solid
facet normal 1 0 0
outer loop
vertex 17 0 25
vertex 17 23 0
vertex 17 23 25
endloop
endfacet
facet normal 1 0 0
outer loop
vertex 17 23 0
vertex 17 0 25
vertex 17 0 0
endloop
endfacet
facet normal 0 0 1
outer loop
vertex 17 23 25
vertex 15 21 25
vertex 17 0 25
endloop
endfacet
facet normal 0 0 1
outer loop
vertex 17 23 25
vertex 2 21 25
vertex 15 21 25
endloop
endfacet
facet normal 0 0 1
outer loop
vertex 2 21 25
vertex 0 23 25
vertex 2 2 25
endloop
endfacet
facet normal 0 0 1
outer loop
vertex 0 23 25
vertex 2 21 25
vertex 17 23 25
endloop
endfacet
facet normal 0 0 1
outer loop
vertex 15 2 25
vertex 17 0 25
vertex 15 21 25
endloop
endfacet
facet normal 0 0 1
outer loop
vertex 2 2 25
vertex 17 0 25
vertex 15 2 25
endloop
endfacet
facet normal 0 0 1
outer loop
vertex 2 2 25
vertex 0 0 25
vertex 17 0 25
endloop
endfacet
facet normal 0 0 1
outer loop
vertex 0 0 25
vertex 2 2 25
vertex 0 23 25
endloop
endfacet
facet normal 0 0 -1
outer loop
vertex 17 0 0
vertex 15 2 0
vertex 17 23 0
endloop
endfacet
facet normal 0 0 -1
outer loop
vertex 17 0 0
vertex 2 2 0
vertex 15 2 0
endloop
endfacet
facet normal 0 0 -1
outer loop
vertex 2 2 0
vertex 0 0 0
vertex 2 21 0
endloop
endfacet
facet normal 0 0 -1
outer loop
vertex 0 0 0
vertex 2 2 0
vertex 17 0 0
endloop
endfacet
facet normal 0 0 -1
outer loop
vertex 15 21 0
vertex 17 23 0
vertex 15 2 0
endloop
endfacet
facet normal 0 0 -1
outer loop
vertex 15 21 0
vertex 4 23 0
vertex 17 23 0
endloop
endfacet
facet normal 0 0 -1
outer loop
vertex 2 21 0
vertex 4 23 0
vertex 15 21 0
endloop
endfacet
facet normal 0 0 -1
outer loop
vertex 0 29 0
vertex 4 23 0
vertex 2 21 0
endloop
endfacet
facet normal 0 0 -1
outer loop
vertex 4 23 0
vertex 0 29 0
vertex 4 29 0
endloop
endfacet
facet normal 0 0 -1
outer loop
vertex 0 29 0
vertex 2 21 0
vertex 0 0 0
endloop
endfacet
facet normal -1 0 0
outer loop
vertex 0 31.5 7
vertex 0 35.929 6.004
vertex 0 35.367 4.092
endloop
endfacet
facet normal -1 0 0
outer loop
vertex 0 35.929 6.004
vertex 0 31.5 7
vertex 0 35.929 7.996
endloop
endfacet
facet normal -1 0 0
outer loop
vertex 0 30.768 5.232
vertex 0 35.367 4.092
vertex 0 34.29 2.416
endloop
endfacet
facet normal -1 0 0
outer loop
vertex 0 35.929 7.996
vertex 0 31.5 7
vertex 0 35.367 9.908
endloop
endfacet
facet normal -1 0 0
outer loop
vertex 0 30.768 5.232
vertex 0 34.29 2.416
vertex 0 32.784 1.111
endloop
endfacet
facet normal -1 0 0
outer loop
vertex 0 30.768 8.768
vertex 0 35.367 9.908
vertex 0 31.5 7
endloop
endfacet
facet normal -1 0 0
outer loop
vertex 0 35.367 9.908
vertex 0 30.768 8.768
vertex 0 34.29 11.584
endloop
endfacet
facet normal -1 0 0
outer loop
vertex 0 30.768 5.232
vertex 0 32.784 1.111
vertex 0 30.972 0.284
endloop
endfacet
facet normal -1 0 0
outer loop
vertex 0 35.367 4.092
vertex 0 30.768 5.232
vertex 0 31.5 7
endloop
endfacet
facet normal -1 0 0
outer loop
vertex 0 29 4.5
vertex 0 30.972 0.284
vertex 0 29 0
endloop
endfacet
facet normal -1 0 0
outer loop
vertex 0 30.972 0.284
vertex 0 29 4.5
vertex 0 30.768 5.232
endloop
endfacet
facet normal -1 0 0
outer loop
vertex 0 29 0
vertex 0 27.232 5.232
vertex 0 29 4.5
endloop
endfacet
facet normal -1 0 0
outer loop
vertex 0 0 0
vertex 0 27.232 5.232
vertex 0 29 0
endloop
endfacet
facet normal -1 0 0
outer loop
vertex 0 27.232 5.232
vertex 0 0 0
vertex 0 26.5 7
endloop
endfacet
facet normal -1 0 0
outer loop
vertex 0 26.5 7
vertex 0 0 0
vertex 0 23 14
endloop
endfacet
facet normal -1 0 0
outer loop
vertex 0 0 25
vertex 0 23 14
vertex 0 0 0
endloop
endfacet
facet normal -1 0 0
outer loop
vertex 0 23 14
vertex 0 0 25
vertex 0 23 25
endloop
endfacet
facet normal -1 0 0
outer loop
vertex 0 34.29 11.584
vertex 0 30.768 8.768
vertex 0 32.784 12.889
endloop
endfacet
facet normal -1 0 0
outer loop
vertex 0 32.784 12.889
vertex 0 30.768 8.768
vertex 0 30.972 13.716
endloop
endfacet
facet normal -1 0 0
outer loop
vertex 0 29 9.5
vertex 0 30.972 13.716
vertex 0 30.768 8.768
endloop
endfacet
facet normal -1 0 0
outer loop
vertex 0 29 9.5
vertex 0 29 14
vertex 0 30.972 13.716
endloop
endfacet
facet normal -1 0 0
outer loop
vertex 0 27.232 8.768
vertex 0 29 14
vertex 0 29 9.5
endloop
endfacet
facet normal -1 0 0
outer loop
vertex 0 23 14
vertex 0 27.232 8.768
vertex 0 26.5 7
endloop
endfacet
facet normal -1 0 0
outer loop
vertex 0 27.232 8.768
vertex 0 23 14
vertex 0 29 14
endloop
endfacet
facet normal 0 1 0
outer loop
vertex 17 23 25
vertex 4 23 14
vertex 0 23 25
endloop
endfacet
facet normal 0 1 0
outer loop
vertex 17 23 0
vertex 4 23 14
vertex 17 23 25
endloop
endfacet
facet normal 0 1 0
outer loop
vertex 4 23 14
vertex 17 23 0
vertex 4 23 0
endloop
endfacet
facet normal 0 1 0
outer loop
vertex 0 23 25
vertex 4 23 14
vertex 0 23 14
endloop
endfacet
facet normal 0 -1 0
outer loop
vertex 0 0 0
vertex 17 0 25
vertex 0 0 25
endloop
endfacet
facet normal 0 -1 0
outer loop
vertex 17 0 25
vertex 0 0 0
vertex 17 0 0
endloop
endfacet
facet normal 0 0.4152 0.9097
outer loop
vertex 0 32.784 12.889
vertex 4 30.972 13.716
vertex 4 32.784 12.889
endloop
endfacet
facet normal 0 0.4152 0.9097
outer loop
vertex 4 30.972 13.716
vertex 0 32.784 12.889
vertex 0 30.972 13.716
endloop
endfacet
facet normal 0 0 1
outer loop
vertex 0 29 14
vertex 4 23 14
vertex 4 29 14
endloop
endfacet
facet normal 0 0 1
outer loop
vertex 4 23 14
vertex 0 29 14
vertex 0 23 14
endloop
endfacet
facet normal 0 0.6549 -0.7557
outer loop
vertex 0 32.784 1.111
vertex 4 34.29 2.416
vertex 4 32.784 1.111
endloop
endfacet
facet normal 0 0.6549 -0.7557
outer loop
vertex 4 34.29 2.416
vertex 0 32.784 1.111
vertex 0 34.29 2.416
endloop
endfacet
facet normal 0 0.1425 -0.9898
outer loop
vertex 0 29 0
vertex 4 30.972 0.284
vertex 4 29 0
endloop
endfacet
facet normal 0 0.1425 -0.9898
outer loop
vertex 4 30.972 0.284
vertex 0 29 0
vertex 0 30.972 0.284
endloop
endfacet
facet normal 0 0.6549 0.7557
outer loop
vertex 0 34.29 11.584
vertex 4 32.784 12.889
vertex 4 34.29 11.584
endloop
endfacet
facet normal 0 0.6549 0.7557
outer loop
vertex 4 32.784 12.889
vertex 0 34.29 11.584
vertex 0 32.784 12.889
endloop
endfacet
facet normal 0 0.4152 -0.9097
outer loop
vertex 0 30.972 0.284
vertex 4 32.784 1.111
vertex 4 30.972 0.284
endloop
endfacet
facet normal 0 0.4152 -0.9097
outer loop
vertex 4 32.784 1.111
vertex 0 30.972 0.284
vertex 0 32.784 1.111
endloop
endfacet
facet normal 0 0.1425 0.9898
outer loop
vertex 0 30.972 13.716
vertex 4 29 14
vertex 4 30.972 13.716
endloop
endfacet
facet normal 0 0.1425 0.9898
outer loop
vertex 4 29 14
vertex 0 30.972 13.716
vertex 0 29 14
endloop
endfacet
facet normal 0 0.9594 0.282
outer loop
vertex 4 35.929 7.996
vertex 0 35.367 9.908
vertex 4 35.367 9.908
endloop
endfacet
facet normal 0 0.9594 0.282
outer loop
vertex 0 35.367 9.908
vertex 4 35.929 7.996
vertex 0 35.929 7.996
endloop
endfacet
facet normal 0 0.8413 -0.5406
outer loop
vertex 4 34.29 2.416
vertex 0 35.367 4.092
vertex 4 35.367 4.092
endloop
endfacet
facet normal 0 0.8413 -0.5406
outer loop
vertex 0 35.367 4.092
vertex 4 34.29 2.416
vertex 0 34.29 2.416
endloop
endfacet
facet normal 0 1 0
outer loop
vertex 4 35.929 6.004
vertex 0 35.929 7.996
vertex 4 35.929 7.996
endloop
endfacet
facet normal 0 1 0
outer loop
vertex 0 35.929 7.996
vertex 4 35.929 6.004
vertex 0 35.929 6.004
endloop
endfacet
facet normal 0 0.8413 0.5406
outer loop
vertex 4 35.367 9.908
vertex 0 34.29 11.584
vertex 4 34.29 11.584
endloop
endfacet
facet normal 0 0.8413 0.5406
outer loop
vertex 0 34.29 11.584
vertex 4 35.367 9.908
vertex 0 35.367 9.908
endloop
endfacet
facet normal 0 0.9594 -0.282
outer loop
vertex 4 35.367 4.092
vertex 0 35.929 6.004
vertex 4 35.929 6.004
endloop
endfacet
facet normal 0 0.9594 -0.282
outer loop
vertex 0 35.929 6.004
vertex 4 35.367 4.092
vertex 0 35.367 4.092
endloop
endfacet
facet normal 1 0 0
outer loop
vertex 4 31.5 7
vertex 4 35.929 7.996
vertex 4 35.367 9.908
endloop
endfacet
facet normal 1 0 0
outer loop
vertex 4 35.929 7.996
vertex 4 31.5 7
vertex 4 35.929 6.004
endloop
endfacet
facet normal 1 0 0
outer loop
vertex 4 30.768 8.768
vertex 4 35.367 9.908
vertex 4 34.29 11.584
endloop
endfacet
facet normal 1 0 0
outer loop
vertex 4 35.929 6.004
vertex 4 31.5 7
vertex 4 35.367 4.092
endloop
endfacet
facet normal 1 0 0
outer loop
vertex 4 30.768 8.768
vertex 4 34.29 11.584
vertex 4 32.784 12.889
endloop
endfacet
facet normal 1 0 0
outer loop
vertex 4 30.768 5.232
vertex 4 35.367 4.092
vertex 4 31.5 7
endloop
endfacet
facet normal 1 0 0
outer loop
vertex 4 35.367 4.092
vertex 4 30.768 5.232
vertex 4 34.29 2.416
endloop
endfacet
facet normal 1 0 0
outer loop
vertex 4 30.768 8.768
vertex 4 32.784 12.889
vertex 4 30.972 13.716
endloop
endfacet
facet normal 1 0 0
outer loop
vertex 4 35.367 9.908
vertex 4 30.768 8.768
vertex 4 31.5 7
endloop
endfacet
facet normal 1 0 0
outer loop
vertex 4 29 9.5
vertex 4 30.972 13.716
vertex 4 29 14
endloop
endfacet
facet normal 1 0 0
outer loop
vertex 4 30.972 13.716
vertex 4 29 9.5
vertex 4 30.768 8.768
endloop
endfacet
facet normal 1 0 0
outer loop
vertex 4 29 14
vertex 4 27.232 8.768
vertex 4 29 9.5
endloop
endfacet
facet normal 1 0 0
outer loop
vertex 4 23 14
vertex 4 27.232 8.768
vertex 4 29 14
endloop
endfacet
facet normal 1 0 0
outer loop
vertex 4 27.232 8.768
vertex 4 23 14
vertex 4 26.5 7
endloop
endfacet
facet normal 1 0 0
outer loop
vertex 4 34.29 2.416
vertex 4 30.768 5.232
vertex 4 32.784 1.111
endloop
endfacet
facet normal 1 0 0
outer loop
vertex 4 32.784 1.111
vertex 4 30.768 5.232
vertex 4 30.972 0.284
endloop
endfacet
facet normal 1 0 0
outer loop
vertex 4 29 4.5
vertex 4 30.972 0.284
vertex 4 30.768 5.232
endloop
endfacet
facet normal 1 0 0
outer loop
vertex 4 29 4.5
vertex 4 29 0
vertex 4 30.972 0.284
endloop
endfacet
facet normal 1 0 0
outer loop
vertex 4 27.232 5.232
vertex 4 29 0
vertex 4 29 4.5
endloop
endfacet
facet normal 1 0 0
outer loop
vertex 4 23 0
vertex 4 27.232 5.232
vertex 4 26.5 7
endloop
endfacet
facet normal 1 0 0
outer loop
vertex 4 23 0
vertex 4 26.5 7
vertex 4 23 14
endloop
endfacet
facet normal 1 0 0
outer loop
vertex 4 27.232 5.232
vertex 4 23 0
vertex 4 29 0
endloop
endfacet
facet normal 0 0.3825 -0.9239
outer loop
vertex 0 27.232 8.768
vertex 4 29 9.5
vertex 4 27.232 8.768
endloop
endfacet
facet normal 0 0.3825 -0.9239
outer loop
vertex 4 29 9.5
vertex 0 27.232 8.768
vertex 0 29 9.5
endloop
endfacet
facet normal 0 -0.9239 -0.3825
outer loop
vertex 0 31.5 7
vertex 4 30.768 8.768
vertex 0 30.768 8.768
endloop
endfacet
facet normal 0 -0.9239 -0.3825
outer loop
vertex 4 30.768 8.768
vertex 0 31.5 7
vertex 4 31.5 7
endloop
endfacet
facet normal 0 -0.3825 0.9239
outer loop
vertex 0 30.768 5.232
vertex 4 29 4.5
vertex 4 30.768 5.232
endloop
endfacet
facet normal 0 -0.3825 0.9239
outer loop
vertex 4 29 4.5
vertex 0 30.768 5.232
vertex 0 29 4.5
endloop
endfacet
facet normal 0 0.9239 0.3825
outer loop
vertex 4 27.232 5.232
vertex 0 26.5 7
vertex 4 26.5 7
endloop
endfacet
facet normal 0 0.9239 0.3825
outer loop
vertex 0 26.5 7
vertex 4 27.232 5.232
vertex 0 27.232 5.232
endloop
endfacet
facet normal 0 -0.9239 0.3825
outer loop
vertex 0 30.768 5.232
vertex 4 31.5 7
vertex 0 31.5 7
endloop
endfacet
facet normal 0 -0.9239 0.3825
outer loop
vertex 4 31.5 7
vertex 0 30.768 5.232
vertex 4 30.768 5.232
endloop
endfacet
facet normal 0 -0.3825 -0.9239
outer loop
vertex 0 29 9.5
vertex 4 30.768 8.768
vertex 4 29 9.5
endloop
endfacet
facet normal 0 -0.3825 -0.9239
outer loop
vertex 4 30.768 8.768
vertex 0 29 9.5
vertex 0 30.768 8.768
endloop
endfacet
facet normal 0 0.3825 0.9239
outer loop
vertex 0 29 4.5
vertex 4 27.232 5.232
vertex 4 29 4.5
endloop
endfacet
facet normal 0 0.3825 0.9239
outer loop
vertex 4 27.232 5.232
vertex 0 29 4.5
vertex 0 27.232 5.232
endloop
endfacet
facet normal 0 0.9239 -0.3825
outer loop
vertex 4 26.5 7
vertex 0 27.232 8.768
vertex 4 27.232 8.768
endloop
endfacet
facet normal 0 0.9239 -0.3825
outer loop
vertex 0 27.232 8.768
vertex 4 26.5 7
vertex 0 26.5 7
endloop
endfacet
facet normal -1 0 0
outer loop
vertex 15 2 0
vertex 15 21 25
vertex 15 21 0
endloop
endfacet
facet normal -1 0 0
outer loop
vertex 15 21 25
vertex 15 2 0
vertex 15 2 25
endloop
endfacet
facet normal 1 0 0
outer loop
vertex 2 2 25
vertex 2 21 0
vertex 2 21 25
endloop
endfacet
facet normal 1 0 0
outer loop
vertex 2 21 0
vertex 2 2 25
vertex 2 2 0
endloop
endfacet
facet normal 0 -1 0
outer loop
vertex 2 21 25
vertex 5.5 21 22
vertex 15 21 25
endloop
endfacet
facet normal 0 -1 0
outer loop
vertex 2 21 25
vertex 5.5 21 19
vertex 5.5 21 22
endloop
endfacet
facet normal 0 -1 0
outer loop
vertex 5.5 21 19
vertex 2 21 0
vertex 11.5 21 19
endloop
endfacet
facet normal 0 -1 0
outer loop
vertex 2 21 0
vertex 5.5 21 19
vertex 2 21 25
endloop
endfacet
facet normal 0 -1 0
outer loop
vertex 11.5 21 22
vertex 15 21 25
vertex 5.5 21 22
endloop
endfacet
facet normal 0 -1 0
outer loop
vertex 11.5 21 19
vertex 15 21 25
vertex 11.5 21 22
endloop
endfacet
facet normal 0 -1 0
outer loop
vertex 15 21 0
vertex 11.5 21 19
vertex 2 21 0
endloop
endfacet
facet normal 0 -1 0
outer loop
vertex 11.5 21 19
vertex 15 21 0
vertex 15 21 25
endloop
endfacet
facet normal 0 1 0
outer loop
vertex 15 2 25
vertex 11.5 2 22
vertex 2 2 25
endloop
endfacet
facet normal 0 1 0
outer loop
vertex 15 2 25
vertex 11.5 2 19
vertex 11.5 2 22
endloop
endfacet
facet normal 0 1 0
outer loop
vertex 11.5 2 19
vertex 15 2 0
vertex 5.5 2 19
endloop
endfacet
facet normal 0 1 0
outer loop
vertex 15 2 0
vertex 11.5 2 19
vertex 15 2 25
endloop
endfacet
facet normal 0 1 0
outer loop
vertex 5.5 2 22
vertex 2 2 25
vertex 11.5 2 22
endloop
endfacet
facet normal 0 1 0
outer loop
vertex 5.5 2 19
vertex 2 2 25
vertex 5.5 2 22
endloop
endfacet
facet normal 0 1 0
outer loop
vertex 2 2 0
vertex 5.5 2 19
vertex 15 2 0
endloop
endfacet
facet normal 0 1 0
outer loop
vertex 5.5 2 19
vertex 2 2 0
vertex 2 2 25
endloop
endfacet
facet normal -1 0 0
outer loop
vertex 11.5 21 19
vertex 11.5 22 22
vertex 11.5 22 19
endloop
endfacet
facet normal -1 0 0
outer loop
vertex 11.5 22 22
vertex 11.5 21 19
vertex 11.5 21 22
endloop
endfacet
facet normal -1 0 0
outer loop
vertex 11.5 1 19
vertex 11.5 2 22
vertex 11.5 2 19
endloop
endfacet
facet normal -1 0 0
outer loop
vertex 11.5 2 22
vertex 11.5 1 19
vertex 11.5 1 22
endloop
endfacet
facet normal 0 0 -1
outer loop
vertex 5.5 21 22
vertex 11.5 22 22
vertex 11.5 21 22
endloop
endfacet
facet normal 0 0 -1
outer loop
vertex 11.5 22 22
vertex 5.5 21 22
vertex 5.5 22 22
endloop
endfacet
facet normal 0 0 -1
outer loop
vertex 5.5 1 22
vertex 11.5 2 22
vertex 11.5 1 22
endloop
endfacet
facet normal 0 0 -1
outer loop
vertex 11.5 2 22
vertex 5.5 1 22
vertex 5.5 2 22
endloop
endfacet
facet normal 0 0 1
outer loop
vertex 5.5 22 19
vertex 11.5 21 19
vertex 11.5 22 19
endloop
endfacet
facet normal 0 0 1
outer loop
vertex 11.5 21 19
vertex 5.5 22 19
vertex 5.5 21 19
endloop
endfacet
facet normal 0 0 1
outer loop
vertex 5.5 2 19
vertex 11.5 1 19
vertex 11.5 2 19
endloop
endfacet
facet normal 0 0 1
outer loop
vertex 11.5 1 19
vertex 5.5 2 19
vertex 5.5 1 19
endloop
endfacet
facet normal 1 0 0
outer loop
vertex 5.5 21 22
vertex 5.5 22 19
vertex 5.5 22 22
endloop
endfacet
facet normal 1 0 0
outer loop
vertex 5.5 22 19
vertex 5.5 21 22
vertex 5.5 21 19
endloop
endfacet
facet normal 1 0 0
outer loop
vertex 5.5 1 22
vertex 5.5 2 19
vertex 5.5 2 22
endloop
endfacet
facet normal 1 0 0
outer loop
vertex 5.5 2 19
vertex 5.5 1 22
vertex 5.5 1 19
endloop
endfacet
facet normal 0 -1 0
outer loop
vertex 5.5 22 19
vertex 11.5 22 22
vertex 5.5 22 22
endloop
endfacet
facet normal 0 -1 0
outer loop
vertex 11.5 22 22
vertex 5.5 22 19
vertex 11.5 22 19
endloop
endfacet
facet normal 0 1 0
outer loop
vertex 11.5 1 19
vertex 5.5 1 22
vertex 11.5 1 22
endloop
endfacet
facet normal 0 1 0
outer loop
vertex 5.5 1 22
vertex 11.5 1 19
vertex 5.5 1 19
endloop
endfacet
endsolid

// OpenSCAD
switch_height = 25;
switch_width = 13;
switch_length = 19;
thickness = 2;


module switch_holder() {

 difference() {
  union() {
   cube([switch_width+thickness*2, switch_length+thickness*2, switch_height]);
   hull() {
    translate([0, switch_length+10, 14/2]) rotate([0, 90, 0]) cylinder(r=14/2, h=4);
    translate([0, switch_length, 0]) cube([4, 10, 14]);
   }
  }
  translate([-1, switch_length+10, 14/2]) rotate([0, 90, 0]) cylinder(r=5/2, h=6);
  translate([thickness, thickness, 0]) cube([switch_width, switch_length, switch_height]);
  translate([(switch_width+thickness*2)/2-6/2, thickness/2, switch_length]) cube([6, switch_length+thickness, 3]);
 }
 
}

switch_holder();
